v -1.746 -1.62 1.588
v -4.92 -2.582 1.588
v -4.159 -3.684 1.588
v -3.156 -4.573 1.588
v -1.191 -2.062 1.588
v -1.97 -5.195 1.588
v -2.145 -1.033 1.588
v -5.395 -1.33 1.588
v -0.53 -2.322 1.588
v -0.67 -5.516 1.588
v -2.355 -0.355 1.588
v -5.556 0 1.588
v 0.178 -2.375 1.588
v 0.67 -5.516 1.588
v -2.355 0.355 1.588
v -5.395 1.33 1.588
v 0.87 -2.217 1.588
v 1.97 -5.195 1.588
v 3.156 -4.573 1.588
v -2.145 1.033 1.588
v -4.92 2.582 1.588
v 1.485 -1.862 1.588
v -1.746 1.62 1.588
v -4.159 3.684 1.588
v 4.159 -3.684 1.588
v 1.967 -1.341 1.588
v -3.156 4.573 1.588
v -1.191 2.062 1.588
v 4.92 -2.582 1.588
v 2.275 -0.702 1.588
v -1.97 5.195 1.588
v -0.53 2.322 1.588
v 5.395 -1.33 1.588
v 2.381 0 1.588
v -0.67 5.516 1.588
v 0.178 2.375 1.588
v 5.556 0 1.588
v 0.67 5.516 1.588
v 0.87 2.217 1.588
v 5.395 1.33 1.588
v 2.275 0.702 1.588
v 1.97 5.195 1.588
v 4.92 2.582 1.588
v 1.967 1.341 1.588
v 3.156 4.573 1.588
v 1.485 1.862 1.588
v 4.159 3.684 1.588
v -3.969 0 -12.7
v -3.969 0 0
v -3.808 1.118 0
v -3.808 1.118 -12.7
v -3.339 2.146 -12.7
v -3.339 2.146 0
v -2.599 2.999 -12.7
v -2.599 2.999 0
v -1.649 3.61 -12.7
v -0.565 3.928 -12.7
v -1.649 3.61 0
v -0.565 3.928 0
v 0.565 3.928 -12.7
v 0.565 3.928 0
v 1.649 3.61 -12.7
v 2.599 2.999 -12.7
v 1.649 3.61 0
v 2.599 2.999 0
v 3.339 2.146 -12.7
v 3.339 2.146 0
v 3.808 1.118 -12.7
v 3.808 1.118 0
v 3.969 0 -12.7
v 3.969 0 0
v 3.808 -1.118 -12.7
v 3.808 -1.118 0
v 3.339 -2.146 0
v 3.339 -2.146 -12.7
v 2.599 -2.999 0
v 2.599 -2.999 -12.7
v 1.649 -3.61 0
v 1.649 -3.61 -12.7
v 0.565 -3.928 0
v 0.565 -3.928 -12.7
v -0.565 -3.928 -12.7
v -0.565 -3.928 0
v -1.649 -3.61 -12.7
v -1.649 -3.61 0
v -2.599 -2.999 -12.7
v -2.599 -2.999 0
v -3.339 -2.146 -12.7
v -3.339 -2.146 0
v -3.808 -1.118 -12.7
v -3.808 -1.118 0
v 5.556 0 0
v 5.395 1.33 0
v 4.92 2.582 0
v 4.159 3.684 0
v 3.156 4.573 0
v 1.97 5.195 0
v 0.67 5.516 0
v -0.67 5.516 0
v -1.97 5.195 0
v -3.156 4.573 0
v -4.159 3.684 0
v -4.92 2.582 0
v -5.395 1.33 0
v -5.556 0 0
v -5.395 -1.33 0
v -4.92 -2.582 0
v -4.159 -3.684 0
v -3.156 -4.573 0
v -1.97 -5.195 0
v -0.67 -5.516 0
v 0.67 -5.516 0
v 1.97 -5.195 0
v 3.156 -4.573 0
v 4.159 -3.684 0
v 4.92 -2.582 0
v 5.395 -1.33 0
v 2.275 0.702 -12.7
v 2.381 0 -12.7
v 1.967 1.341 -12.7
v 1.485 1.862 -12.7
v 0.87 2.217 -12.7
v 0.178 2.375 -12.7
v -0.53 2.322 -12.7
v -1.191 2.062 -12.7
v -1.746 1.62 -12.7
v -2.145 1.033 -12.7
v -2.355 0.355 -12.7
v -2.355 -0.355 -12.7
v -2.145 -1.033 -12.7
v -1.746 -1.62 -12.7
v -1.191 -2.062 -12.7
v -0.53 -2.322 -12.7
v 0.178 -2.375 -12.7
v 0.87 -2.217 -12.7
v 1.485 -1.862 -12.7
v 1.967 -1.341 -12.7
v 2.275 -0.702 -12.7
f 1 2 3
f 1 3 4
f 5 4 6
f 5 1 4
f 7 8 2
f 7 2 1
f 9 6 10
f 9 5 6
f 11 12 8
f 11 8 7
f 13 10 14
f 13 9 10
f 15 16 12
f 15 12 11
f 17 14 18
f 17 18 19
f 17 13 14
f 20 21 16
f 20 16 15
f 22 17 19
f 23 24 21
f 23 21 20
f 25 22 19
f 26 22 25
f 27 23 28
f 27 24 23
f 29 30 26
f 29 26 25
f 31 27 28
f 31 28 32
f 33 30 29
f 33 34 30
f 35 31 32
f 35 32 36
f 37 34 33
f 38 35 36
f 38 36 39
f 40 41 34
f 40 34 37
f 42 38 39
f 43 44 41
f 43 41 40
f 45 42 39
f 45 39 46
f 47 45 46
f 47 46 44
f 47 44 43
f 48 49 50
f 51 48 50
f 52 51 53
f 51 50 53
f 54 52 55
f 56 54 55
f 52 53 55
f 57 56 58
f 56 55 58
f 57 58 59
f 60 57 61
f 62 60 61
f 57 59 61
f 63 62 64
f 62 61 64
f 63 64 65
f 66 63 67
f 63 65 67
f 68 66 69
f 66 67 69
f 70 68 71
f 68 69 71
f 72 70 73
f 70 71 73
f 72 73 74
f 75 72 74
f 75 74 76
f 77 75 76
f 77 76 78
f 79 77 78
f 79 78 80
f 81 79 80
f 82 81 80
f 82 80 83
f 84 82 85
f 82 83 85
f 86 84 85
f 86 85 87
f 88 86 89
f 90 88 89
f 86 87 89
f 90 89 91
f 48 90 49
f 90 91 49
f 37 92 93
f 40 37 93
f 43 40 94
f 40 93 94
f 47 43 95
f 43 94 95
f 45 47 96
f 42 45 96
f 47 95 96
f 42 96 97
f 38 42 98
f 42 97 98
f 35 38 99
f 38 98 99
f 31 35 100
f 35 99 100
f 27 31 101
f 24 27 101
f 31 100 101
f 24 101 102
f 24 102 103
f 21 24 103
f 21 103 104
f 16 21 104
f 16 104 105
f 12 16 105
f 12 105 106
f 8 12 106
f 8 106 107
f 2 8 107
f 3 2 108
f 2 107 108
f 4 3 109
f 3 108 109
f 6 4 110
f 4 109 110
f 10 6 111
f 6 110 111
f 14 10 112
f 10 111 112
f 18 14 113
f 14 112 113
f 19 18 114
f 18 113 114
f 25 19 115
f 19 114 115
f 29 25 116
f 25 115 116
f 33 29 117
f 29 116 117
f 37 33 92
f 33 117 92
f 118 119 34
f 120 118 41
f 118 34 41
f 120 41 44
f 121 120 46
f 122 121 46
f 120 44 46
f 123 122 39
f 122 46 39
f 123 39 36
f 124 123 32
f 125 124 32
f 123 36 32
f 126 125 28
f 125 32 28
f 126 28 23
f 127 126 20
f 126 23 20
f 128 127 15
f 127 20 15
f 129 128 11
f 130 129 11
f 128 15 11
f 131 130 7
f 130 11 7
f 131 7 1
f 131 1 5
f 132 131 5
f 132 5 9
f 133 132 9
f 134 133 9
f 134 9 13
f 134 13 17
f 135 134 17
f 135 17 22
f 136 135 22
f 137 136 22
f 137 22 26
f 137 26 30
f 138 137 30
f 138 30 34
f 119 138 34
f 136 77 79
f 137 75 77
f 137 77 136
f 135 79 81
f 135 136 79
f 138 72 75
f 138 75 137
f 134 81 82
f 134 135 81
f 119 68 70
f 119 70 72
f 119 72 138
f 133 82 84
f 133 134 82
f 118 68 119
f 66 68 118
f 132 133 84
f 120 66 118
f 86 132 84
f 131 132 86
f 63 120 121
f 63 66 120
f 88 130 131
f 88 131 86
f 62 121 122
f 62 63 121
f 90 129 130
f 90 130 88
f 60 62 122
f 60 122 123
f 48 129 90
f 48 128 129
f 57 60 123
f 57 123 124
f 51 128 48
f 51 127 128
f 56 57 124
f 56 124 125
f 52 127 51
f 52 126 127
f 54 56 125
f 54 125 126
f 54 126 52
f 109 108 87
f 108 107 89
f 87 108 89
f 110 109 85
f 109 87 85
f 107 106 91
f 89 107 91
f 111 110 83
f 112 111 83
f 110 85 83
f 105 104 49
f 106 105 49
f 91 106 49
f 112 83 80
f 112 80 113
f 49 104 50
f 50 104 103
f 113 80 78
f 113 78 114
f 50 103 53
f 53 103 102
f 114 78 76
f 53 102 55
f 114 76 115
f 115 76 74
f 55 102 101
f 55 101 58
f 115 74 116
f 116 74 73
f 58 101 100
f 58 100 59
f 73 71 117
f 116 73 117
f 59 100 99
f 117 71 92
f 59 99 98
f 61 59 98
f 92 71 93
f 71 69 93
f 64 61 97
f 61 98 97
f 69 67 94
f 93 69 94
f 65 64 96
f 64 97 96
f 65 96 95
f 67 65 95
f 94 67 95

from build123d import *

# Parameters (mm, degrees)
SKETCH1_R           = 5.55625
BOSS_EXTRUDE1_DEPTH = 1.5875
SKETCH2_R           = 3.96875
BOSS_EXTRUDE2_DEPTH = 12.7
SKETCH3_R           = 2.38125
CUT_EXTRUDE1_DEPTH  = 15.2875


with BuildPart() as part:
    # Sketch1 → Boss-Extrude1 (new body)
    with BuildSketch(Plane.XY):
        Circle(SKETCH1_R)
    extrude(amount=BOSS_EXTRUDE1_DEPTH)

    # Sketch2 → Boss-Extrude2 (add)
    with BuildSketch(Plane(origin=(0, 0, 0), x_dir=(-1, 0, 0), z_dir=(0, 0, -1))):
        Circle(SKETCH2_R)
    extrude(amount=BOSS_EXTRUDE2_DEPTH)

    # Sketch3 → Cut-Extrude1 (cut, through all)
    with BuildSketch(Plane.XY.offset(1.5875)):
        Circle(SKETCH3_R)
    extrude(amount=-CUT_EXTRUDE1_DEPTH, mode=Mode.SUBTRACT)


solid = part.part
